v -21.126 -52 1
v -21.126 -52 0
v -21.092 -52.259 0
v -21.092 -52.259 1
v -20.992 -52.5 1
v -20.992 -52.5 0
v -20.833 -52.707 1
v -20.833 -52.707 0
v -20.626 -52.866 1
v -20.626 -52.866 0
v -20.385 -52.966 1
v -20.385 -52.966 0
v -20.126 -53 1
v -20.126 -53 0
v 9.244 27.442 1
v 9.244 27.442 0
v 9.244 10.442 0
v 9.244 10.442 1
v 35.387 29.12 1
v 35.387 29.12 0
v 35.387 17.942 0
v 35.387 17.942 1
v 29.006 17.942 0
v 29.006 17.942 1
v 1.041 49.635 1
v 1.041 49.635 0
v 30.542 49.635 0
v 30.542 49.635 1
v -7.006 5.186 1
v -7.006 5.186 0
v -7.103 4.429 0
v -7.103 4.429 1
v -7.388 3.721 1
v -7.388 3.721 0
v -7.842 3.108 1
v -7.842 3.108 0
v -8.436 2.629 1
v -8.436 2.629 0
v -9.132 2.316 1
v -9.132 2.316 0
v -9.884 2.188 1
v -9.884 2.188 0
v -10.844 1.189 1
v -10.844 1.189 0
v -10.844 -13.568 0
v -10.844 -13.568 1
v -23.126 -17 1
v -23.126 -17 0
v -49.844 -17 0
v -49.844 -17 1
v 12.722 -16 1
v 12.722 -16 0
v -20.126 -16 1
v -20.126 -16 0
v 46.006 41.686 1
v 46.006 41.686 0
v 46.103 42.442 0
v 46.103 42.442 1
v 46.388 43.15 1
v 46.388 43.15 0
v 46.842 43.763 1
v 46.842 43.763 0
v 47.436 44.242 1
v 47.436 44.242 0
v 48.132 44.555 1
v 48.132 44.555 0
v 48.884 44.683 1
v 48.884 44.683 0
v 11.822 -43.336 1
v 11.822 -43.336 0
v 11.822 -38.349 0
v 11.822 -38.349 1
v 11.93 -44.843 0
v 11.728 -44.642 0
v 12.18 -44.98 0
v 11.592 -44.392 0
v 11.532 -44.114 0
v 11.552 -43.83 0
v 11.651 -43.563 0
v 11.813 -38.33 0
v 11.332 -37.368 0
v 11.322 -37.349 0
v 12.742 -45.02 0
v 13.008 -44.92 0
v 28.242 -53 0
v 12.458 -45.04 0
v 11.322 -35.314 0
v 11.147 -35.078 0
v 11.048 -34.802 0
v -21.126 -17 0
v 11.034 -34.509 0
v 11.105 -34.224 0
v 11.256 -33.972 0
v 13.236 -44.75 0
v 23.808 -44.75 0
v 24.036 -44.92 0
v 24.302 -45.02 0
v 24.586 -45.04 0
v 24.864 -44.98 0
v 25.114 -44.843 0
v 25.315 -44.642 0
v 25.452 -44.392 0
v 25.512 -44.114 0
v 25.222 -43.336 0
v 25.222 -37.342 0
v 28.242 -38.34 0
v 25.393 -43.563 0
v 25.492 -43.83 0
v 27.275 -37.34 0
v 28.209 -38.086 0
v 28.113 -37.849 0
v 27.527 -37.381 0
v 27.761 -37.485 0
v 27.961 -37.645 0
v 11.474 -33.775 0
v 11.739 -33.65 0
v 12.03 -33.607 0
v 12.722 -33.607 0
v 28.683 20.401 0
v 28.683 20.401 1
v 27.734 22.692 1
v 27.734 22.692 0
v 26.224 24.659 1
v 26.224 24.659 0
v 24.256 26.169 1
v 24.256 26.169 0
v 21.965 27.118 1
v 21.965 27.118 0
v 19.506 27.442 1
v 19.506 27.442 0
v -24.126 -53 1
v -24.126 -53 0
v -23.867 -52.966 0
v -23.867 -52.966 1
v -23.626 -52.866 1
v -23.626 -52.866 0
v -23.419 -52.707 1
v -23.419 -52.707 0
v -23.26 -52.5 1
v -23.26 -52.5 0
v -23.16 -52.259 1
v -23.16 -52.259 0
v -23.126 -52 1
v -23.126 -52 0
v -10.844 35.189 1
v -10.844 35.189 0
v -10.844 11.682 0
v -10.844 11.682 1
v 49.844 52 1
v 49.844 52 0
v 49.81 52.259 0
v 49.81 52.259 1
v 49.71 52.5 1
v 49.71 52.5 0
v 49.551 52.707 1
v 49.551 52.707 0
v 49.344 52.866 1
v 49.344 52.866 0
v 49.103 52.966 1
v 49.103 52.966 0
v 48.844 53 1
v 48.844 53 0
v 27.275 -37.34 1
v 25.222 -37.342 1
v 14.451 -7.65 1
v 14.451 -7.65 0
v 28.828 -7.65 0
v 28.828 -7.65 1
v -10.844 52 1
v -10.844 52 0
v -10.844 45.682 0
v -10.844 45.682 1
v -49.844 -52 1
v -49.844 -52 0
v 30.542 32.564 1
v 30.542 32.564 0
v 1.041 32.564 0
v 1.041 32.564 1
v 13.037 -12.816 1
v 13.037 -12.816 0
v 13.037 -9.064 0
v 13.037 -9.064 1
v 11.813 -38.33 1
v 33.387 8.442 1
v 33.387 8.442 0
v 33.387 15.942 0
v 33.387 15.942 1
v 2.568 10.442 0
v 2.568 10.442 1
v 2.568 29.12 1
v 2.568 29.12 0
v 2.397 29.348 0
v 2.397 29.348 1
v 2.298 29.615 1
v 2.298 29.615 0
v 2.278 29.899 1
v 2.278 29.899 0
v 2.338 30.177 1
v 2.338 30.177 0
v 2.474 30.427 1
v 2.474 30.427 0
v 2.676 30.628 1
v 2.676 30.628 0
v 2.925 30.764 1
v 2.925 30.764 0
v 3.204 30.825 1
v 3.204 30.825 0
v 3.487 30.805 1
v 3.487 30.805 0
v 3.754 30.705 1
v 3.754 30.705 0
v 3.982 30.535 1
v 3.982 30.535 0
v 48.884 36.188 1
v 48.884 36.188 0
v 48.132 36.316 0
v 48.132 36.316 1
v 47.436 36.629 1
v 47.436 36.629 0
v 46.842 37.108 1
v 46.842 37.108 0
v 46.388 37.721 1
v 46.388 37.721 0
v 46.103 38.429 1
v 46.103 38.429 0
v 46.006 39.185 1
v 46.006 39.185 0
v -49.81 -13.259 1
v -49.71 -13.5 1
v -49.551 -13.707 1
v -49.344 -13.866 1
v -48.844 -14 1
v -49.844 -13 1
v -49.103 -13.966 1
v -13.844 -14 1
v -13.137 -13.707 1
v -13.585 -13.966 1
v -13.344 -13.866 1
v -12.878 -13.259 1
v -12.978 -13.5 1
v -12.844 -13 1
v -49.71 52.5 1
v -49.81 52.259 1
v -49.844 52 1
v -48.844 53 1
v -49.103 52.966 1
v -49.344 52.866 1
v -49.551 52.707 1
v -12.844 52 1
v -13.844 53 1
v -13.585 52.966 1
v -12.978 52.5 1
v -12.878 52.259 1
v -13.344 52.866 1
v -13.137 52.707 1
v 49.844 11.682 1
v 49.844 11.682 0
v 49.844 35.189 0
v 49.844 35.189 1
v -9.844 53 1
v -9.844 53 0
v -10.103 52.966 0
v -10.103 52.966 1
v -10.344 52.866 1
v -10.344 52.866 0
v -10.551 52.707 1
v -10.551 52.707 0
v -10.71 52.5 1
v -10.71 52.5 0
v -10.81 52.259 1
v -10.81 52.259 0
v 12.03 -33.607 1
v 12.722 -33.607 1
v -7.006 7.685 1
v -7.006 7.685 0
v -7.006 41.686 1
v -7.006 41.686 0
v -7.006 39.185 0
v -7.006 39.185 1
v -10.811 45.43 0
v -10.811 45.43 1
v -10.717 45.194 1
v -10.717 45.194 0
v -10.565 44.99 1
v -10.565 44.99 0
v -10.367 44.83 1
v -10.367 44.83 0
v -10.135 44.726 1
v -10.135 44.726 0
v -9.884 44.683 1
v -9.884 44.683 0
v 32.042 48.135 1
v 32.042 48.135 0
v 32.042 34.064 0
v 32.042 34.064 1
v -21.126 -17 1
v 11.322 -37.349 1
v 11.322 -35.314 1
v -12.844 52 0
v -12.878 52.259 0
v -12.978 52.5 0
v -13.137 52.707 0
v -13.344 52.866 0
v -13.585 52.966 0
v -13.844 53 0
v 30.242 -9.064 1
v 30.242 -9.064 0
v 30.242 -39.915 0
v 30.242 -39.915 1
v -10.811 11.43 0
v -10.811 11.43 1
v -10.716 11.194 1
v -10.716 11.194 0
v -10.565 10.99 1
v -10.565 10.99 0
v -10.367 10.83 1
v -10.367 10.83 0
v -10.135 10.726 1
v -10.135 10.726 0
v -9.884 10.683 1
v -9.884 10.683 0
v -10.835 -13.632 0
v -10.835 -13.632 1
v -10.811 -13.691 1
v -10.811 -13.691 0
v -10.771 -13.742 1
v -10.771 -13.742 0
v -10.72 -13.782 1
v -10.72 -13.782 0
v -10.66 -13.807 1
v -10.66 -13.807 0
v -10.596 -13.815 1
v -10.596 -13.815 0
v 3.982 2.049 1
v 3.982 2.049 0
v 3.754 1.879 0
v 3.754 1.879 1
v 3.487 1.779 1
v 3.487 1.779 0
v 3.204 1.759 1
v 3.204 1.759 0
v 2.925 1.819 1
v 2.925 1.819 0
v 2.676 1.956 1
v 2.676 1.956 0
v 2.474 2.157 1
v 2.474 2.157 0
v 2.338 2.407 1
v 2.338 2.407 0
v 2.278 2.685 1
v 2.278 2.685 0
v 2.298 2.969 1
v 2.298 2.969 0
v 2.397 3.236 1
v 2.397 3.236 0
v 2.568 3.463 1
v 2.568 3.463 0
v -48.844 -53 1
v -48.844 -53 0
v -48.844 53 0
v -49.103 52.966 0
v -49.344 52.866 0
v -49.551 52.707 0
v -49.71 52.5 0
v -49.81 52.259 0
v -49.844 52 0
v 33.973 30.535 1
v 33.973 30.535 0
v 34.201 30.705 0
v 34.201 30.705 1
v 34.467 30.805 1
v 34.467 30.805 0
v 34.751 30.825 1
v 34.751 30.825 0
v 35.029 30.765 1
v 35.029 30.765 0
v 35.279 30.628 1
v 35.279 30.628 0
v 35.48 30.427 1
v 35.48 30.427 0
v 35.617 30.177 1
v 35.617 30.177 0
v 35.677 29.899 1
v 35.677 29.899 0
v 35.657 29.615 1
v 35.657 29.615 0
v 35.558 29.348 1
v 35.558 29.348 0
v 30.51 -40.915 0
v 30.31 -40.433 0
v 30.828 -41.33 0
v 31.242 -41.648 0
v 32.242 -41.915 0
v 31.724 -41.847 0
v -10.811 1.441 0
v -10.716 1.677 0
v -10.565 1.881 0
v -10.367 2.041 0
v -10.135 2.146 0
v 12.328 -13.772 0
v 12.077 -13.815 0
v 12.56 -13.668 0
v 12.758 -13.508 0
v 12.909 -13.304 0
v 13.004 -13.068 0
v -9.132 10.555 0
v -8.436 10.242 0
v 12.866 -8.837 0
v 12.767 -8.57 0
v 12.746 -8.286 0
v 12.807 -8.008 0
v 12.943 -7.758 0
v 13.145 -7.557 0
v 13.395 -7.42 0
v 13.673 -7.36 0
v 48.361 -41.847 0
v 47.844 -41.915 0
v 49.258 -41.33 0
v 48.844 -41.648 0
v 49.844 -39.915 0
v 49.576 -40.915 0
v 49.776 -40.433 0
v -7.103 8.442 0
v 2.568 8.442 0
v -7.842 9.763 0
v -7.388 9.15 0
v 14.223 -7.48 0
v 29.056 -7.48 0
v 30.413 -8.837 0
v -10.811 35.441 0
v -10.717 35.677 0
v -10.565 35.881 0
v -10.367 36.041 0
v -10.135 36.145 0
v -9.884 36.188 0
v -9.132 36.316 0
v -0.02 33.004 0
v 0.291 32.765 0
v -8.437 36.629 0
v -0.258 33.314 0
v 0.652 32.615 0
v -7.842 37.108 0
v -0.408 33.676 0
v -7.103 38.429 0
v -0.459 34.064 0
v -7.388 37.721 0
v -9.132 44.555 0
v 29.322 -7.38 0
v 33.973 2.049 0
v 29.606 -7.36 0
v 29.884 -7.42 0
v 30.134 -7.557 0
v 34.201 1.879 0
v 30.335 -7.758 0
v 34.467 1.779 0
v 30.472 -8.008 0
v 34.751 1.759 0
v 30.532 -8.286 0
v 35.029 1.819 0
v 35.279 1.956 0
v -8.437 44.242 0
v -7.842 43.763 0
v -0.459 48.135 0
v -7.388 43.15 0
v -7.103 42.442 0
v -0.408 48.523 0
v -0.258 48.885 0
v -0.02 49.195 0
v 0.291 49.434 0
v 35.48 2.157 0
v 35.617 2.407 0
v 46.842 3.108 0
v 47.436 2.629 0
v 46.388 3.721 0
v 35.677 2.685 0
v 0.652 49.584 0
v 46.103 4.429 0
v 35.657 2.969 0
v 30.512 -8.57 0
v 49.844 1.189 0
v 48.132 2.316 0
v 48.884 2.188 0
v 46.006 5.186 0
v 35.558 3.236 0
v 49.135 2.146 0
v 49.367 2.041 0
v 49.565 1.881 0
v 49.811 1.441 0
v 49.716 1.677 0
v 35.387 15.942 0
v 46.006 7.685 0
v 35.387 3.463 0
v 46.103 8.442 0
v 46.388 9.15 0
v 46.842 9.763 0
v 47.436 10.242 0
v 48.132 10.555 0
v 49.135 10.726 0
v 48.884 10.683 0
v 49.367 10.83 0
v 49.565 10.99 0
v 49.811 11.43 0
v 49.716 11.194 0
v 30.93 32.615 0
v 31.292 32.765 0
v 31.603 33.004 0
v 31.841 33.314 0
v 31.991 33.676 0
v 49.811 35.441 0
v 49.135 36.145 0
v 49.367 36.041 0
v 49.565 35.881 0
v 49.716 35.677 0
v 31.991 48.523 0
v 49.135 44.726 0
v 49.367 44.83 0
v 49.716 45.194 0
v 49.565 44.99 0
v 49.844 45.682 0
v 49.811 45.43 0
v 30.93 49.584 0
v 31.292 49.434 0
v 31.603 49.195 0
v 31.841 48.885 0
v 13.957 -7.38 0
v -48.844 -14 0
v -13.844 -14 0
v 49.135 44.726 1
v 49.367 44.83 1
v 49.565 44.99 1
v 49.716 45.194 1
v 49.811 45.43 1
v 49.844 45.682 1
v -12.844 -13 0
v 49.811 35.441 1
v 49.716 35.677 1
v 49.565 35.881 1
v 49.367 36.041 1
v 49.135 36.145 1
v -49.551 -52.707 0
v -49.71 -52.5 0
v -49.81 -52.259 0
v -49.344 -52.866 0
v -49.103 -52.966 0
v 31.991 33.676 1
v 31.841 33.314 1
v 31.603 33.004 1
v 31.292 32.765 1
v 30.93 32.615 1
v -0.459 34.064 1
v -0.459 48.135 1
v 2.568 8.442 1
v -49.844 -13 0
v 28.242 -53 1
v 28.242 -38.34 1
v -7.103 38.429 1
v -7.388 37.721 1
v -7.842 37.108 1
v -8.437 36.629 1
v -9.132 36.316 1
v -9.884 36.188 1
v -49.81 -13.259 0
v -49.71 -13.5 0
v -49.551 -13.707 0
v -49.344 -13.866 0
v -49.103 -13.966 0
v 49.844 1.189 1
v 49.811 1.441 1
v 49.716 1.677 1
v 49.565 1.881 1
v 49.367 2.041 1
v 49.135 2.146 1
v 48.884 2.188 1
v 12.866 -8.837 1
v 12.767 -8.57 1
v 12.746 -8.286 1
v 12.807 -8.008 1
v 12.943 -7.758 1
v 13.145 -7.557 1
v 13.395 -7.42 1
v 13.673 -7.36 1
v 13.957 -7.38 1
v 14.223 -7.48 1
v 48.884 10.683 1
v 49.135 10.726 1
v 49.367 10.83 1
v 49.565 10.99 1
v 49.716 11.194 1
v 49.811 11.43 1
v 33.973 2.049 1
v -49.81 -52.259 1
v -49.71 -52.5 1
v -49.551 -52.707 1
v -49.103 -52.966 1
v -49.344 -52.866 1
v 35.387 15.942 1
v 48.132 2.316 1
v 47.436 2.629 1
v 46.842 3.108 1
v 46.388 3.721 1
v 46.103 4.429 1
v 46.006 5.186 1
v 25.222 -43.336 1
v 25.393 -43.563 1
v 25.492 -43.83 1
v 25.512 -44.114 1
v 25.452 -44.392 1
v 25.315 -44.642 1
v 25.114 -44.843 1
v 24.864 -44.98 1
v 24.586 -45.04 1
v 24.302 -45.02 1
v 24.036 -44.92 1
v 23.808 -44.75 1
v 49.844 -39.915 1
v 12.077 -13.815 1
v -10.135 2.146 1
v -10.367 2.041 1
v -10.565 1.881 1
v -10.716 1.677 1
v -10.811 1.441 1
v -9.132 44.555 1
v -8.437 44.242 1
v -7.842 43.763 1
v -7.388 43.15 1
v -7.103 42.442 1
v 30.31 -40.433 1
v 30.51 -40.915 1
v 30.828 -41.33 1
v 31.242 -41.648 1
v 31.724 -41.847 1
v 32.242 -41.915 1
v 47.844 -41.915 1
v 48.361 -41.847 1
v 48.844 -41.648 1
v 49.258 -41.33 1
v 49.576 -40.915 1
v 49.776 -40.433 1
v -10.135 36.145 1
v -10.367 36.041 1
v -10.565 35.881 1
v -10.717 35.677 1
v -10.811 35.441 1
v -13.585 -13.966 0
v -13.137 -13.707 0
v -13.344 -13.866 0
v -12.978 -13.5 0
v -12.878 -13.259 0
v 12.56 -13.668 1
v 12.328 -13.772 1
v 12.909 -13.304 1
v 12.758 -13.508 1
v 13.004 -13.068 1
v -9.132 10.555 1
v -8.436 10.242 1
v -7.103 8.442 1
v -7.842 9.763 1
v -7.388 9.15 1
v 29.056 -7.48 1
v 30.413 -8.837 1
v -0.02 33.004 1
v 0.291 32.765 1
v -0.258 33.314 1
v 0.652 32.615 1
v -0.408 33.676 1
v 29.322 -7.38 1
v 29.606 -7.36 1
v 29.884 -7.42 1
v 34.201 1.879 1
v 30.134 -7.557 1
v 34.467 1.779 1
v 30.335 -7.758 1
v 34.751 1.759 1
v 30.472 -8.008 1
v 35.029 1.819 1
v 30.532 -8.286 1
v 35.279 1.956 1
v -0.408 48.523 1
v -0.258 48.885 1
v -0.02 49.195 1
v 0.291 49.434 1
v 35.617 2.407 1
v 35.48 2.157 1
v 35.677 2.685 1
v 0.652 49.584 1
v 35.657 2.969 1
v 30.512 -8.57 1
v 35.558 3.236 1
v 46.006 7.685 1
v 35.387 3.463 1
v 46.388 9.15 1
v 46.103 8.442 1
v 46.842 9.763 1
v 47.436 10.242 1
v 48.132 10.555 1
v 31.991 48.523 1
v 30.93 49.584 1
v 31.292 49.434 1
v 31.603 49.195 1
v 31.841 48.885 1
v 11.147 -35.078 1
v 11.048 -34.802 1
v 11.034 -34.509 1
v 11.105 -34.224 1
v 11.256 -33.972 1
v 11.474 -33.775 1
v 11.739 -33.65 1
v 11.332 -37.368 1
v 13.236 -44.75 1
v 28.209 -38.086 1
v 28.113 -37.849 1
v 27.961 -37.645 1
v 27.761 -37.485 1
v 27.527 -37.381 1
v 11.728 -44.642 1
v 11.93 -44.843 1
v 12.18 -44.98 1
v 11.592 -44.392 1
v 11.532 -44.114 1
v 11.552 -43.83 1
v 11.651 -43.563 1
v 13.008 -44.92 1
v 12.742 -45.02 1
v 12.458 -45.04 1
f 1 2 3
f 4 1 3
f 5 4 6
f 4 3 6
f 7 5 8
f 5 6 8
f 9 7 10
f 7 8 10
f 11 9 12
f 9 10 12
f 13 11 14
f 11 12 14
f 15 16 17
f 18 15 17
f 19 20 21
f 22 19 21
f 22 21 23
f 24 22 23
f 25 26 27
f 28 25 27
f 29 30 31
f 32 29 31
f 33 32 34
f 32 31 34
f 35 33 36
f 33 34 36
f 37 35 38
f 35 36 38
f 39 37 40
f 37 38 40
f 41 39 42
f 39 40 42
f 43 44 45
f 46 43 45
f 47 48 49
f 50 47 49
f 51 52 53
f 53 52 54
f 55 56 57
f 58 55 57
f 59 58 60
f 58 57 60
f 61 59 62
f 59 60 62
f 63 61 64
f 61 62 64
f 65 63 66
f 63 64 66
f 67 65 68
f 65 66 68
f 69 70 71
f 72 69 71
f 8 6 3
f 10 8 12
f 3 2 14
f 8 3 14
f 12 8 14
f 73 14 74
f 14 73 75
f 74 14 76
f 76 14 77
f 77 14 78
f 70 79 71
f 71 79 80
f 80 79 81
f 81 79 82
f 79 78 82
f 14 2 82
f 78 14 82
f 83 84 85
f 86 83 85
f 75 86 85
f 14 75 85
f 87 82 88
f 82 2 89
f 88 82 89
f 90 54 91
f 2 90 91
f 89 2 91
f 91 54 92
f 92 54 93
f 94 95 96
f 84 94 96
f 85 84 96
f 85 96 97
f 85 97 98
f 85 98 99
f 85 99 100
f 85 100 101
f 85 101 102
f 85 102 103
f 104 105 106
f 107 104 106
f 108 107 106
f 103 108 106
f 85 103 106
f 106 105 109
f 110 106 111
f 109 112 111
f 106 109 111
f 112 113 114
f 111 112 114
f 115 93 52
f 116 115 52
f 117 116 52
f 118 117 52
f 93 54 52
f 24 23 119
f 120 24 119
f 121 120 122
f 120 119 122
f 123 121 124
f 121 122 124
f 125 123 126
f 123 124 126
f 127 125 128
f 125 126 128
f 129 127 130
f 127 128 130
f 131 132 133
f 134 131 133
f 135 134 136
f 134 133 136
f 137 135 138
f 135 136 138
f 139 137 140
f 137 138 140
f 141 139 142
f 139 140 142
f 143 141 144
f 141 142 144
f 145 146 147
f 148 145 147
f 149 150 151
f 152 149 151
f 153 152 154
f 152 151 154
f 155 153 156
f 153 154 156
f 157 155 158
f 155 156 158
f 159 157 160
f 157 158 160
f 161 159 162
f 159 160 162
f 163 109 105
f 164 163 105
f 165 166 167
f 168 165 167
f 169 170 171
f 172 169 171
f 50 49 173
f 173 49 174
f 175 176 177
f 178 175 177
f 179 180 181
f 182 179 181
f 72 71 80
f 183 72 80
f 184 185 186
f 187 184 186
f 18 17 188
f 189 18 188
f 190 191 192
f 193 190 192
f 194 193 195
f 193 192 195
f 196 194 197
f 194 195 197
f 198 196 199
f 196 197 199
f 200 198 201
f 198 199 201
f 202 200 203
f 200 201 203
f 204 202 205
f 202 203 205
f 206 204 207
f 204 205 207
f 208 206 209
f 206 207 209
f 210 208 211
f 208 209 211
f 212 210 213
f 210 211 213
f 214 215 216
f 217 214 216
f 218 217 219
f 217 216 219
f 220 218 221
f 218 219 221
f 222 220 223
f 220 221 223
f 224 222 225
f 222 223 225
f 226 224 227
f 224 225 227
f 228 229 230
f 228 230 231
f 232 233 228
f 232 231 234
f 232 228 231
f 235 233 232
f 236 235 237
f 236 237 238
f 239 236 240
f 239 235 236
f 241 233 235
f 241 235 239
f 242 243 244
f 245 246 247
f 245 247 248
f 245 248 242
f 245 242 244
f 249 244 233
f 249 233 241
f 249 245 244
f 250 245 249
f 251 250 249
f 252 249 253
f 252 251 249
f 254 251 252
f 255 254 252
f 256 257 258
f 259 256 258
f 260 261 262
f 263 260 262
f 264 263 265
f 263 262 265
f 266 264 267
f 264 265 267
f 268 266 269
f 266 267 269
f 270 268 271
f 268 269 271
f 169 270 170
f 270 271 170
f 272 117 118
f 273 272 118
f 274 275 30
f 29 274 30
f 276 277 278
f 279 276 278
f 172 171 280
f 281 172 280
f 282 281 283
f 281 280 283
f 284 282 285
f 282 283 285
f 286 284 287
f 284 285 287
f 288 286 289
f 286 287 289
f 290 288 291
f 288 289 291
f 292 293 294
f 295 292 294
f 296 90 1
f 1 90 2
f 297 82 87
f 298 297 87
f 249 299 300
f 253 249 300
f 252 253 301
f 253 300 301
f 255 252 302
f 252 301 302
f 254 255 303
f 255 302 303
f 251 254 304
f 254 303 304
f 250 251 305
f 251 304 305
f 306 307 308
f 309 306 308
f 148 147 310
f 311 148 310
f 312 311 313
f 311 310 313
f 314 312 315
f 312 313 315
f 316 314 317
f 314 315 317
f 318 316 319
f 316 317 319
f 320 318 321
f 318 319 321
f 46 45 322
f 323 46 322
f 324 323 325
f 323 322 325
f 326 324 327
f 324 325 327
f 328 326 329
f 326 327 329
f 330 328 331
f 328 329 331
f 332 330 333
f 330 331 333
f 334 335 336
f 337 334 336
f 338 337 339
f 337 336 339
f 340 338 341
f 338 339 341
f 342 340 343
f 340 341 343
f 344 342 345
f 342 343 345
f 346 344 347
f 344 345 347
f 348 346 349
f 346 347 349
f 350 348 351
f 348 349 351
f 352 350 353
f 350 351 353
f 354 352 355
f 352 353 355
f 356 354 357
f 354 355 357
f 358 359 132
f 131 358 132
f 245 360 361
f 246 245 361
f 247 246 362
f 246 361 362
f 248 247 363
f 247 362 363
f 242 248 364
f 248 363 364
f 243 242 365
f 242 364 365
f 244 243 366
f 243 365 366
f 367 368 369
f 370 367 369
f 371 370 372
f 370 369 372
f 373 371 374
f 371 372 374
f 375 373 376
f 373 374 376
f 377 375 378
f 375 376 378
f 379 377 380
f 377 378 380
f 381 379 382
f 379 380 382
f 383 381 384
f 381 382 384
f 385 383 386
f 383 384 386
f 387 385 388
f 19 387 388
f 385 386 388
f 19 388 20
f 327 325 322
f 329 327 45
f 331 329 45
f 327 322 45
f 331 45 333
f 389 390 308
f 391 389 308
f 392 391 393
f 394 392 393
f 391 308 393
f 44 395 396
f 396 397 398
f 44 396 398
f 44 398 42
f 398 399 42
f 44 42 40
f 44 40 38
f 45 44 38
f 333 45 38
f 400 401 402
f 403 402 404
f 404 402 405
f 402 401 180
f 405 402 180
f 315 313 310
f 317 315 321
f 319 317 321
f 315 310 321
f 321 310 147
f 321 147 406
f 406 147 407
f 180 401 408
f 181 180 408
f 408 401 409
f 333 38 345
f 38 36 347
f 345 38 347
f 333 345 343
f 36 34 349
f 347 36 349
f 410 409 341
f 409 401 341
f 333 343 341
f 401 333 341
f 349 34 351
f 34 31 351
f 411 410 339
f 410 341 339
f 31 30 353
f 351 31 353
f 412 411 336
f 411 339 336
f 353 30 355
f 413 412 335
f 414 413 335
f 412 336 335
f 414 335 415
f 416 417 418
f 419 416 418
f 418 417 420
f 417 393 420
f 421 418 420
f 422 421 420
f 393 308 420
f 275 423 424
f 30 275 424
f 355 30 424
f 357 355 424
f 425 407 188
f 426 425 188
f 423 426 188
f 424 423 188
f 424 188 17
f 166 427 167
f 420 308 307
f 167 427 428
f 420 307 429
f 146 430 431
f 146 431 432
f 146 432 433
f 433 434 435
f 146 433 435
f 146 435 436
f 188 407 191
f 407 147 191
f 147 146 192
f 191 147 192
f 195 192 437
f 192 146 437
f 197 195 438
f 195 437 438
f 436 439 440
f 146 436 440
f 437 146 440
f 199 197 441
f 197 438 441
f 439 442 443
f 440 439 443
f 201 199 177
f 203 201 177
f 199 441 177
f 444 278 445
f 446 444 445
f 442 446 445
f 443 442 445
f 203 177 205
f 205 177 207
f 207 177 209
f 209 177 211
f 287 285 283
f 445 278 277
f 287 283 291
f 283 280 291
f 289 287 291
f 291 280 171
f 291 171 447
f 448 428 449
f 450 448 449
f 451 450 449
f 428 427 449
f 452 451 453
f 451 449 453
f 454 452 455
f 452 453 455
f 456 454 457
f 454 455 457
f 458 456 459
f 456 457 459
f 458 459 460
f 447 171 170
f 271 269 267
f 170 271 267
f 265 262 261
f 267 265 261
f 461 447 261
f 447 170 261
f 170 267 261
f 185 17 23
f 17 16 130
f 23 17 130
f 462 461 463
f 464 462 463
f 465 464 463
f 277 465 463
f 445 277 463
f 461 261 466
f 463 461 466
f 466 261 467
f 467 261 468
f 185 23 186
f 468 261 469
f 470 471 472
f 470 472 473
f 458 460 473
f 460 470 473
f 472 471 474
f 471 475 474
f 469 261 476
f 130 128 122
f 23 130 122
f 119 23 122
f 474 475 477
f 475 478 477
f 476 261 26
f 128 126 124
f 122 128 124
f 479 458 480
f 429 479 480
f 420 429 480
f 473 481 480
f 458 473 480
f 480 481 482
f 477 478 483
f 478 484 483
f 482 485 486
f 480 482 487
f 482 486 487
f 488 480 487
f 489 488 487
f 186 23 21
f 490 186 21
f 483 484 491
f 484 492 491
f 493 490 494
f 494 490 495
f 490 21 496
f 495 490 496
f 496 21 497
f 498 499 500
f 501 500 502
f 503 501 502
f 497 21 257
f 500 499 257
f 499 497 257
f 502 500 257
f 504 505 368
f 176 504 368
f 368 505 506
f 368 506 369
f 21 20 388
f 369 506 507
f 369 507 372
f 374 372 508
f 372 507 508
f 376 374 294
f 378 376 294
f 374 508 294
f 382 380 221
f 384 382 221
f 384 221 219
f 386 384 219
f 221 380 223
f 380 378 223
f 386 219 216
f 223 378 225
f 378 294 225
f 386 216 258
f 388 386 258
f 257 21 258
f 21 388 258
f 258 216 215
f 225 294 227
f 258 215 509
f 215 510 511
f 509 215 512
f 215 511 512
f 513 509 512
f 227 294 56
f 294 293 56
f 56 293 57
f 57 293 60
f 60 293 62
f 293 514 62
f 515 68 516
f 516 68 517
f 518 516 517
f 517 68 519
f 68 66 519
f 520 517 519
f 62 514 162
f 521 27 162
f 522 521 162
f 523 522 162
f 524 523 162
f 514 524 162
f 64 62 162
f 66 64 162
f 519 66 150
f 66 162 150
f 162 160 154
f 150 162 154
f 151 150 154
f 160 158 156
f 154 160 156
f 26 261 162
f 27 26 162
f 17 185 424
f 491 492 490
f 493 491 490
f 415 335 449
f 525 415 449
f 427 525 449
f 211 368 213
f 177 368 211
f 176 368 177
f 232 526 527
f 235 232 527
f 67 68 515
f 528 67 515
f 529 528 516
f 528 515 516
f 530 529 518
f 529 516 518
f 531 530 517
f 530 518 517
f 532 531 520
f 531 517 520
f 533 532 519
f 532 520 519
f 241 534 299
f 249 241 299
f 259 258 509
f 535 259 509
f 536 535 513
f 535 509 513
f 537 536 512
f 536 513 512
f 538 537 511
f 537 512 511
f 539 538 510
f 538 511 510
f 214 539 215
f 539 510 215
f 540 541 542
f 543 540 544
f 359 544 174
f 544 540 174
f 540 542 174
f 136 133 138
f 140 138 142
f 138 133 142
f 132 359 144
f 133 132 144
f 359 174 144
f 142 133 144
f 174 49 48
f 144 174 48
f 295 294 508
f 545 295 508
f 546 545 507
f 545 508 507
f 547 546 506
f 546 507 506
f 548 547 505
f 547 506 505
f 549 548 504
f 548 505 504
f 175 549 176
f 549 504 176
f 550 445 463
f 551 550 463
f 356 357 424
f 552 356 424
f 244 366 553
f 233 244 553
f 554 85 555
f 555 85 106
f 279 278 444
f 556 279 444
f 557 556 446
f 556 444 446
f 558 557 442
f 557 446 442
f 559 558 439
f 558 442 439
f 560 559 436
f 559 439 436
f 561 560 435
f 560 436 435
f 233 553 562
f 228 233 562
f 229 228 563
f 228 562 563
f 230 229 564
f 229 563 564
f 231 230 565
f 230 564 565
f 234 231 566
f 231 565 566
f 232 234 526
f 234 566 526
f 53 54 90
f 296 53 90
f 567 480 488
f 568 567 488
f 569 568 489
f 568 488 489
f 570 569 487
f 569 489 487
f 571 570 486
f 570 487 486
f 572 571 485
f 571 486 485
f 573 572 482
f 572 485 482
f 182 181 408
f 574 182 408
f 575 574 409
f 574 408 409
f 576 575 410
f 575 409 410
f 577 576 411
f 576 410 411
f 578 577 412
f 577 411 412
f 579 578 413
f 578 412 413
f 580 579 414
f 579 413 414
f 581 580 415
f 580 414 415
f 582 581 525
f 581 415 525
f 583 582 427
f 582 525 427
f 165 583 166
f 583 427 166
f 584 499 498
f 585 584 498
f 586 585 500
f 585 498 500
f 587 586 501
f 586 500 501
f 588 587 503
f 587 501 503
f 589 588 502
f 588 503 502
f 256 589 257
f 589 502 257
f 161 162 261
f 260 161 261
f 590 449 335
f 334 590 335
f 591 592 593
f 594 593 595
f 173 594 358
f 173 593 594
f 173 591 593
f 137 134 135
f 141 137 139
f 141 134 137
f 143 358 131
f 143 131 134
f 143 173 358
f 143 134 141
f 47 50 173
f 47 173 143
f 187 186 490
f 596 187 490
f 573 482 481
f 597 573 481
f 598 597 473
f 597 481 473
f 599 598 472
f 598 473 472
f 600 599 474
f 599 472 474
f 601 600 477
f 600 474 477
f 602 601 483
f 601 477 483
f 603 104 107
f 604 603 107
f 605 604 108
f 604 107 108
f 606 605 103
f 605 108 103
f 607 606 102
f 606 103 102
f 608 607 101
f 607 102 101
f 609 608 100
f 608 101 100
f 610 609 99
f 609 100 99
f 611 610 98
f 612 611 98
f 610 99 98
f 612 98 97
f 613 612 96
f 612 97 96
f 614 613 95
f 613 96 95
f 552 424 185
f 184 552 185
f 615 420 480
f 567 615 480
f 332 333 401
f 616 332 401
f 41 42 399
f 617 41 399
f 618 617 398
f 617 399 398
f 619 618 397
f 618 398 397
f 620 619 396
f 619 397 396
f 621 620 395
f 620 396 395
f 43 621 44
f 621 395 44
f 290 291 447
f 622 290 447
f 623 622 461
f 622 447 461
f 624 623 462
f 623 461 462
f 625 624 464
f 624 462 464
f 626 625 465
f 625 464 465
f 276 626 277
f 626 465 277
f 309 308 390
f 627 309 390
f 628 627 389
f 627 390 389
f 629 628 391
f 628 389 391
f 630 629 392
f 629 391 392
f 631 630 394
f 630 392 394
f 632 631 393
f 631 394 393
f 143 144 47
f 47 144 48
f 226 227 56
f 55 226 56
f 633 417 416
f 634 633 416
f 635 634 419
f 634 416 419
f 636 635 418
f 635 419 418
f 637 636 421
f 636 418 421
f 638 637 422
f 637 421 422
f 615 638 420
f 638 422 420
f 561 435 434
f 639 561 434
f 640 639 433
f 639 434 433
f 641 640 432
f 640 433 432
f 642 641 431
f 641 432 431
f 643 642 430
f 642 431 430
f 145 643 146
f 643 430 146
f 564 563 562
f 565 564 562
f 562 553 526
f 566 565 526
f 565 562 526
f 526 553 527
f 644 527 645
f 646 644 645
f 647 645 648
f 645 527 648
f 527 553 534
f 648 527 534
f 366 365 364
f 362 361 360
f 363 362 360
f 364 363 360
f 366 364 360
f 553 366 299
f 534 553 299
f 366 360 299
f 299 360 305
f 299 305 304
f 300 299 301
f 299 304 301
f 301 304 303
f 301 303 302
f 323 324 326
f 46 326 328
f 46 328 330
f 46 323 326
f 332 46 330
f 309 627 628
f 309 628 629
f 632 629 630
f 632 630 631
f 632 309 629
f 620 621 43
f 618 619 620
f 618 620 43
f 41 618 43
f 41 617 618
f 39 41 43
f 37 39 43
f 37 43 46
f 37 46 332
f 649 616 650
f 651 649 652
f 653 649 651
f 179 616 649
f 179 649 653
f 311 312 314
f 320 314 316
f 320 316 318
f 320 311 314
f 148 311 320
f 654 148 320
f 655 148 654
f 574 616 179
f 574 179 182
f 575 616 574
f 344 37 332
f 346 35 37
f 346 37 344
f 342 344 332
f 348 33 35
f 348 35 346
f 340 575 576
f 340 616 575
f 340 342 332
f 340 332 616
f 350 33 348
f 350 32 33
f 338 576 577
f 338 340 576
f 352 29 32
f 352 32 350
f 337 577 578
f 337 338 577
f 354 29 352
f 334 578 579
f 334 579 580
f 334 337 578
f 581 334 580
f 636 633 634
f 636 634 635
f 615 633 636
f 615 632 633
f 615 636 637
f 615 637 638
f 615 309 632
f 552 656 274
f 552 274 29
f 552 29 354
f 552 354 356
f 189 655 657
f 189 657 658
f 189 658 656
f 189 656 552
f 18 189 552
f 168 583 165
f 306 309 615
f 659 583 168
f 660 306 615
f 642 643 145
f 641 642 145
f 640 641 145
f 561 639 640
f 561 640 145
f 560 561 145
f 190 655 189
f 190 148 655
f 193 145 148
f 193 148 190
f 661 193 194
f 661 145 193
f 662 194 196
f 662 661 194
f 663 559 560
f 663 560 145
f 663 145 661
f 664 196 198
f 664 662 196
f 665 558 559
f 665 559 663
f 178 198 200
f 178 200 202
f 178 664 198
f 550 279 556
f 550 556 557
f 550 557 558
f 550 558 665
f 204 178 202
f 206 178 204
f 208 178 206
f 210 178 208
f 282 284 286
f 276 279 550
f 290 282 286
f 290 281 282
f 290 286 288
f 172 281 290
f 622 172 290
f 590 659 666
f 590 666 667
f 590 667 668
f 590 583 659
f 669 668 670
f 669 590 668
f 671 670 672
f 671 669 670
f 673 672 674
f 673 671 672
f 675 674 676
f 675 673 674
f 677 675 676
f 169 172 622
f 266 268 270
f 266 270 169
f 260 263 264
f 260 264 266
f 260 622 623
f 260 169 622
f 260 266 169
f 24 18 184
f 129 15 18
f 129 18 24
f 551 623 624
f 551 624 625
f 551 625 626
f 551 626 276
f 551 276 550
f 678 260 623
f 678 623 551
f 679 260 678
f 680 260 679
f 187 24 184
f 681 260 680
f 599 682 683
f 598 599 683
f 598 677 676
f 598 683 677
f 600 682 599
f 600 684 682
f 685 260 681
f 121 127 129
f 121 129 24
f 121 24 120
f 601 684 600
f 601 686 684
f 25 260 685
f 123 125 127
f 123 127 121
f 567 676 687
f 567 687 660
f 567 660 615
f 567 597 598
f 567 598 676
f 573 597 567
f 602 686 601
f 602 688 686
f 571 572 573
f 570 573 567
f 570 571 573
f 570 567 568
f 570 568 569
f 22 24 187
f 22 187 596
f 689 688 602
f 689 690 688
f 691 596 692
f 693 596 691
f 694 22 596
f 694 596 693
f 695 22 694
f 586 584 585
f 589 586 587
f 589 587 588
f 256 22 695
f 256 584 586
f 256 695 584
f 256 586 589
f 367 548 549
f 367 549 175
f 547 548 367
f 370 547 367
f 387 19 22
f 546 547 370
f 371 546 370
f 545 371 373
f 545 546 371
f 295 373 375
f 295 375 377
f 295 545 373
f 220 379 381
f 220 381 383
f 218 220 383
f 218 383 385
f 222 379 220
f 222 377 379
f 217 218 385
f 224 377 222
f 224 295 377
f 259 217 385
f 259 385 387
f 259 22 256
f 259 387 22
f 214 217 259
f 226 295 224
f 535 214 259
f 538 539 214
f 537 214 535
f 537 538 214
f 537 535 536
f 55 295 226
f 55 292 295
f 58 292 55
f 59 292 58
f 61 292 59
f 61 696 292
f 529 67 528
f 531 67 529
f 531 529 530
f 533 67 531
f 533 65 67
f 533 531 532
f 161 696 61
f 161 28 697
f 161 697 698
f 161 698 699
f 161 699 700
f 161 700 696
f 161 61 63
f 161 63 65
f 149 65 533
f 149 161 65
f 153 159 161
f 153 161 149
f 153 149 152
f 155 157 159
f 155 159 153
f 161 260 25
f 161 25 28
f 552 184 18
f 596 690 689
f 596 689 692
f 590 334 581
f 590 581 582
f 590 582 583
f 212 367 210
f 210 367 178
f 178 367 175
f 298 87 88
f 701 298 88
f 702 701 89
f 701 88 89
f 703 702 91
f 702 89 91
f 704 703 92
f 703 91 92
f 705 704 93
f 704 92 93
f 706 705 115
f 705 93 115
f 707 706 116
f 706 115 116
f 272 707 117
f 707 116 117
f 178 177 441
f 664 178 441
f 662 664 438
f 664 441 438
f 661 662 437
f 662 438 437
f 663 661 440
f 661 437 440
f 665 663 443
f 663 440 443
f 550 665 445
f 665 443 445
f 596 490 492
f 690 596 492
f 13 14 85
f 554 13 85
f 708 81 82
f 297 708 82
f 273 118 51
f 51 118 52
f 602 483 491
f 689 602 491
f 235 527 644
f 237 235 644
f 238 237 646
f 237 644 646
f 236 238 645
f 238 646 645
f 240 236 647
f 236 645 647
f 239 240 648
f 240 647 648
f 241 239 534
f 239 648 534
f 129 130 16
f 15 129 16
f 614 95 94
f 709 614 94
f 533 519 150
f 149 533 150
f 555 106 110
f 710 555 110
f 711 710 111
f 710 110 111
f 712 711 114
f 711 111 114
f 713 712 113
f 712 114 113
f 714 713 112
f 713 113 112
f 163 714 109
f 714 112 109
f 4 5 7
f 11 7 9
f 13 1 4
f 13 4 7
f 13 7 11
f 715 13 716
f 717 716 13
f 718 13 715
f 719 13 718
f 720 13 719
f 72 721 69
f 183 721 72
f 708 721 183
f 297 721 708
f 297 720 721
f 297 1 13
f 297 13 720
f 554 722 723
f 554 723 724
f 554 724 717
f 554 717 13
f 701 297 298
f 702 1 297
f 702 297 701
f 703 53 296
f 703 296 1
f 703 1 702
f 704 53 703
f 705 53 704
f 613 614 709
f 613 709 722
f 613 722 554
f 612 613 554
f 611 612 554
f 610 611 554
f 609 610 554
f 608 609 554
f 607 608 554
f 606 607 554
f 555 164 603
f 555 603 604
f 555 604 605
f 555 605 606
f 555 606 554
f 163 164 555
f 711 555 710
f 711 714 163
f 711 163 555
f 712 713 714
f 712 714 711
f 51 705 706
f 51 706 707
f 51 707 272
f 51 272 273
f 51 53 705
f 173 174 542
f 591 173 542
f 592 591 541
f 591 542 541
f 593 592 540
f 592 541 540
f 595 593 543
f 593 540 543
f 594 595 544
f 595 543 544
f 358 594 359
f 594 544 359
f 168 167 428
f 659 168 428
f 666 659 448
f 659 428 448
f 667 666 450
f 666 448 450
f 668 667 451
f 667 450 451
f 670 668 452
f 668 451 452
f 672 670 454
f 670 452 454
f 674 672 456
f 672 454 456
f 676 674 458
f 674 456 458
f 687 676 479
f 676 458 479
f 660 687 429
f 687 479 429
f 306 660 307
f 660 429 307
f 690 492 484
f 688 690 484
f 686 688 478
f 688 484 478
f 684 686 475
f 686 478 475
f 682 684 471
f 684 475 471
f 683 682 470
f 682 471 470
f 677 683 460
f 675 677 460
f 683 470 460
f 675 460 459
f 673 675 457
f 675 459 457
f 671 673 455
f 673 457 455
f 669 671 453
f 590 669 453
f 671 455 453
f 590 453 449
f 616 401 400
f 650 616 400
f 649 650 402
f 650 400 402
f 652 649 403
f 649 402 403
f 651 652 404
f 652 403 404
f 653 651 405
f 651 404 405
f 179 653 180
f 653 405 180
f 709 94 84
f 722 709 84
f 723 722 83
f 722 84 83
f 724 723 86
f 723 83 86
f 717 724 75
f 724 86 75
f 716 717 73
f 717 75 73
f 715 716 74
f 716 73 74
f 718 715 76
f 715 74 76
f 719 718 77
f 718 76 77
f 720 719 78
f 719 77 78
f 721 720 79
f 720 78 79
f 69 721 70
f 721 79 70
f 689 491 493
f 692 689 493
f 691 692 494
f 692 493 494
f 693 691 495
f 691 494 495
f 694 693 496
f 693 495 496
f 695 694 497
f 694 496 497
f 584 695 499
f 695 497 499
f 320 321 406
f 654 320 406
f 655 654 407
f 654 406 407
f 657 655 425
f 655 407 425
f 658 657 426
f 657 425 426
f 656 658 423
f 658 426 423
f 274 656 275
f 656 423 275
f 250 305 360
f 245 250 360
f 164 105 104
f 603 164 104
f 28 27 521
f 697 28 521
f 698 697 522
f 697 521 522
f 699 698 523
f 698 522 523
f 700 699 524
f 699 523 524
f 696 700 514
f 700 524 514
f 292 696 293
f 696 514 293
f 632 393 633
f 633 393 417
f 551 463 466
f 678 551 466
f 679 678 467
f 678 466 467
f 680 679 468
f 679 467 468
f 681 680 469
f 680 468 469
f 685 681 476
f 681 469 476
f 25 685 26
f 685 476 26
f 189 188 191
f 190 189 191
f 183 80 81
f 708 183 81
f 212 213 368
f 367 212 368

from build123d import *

# Parameters (mm, degrees)
F1_DEPTH = 1


# Not quite as in the source:
# - ends of sketch curves that miss each other by under 0.0002 mm in the source are joined


with BuildPart() as f1:
    # F0 (on Top) → F1 (new body)
    with BuildSketch(Plane.XY):
        with BuildLine():
            Line((-49.84369, 52.000023), (-49.84369, -4.632071))
            Line((-49.84369, -4.632071), (-49.84369, -12.999847))
            ThreePointArc((-49.84369, -12.999847), (-49.5508014675, -13.7069564675), (-48.843692, -13.999845))
            Line((-48.843692, -13.999845), (-13.843762, -13.999845))
            ThreePointArc((-13.843762, -13.9998449989), (-13.136642867, -13.706966133), (-12.8437640011, -12.999847))
            Line((-12.843764, -12.999847), (-12.843764, -4.632071))
            Line((-12.843764, -4.632071), (-12.843764, 52.000023))
            ThreePointArc((-12.8437640013, 52.000023), (-13.1366419884, 52.7071430116), (-13.843762, 53.0000209987))
            Line((-13.843762, 53.000021), (-48.843692, 53.000021))
            ThreePointArc((-48.843692, 53.0000209998), (-49.5508026391, 52.7071336391), (-49.8436899998, 52.000023))
        make_face()
    extrude(amount=F1_DEPTH)


with BuildPart() as f1b:
    # F0 (on Top) → F1, piece 2 (new body)
    with BuildSketch(Plane.XY):
        with BuildLine():
            Line((-48.843692, -53.000021), (-24.125936, -53.000021))
            ThreePointArc((-24.125936, -53.000021), (-23.4188315117, -52.7071274883), (-23.125938, -52.000023))
            Line((-23.125938, -52.000023), (-23.125938, -16.999839))
            Line((-23.125938, -16.999839), (-49.84369, -16.999839))
            Line((-49.84369, -16.999839), (-49.84369, -52.000023))
            ThreePointArc((-49.843689999, -52.000023), (-49.5507844797, -52.7071154797), (-48.843692, -53.000020999))
        make_face()
    extrude(amount=F1_DEPTH)


with BuildPart() as f1c:
    # F0 (on Top) → F1, piece 3 (new body)
    with BuildSketch(Plane.XY):
        with BuildLine():
            ThreePointArc((11.3220496611, -35.3140013389), (11.1054475003, -34.2240151152), (12.0297310005, -33.6070171613))
            Line((12.0297310005, -33.6070171613), (12.722098, -33.607018))
            Line((12.722098, -33.607018), (12.722098, -15.999841))
            Line((12.722098, -15.999841), (-20.125944, -15.999841))
            Line((-20.125944, -15.999841), (-21.125942, -16.999839))
            Line((-21.125942, -16.999839), (-21.125942, -52.000023))
            ThreePointArc((-21.125942, -52.000023), (-20.8330265213, -52.7071055213), (-20.125944, -53.000020997))
            Line((-20.125944, -53.000020997), (28.242006, -53.000021))
            Line((28.242006, -53.000021), (28.242006, -52.000023))
            Line((28.242006, -52.000023), (28.242006, -38.339903))
            ThreePointArc((28.242006, -38.339903), (27.9606950958, -37.6445668865), (27.2750267787, -37.3404499772))
            Line((27.2750267787, -37.3404499772), (25.221946, -37.341683))
            Line((25.221946, -37.341683), (25.221946, -43.335575))
            ThreePointArc((25.221946, -43.335575), (25.2219457726, -44.7498467726), (23.8076742274, -44.7498467726))
            Line((23.8076742274, -44.7498467726), (13.236194, -44.749847))
            ThreePointArc((13.236194, -44.749847), (11.8219222274, -44.7498467726), (11.8219222274, -43.3355752274))
            Line((11.8219222274, -43.3355752274), (11.821922, -38.348793))
            Line((11.821922, -38.348793), (11.8126693234, -38.3302876467))
            Line((11.8126693234, -38.3302876467), (11.3316786766, -37.3683063533))
            Line((11.3316786766, -37.3683063533), (11.32205, -37.349049))
            Line((11.32205, -37.349049), (11.3220496611, -35.3140013389))
        make_face()
    extrude(amount=F1_DEPTH)


with BuildPart() as f1d:
    # F0 (on Top) → F1, piece 4 (new body)
    with BuildSketch(Plane.XY):
        with BuildLine():
            Line((-9.84377, -13.814933), (12.077446, -13.814933))
            ThreePointArc((12.077446, -13.814933), (12.7580726434, -13.5084192102), (13.0368039831, -12.815951))
            Line((13.0368039831, -12.815951), (13.036804, -9.064371))
            ThreePointArc((13.036804, -9.064371), (13.0368846628, -7.6501796628), (14.4510763316, -7.6503526685))
            Line((14.4510763316, -7.6503526685), (28.82773, -7.650353))
            ThreePointArc((28.82773, -7.650353), (30.2419053372, -7.6501956628), (30.2420023393, -9.0643713393))
            Line((30.2420023393, -9.0643713393), (30.242002, -39.915465))
            ThreePointArc((30.242002, -39.915465), (30.8277878518, -41.3296751482), (32.241998, -41.915461))
            Line((32.241998, -41.915461), (47.843694, -41.915461))
            ThreePointArc((47.843694, -41.915461), (49.2579050268, -41.3296760268), (49.84369, -39.915465))
            Line((49.84369, -39.915465), (49.84369, 1.188847))
            ThreePointArc((49.84369, 1.188847), (49.5650323815, 1.8814639379), (48.8843320024, 2.1880830581))
            ThreePointArc((48.8843320024, 2.1880830581), (46.8422776076, 3.1078090407), (46.0062580004, 5.185537))
            Line((46.0062580004, 5.185537), (46.006258, 7.685405))
            ThreePointArc((46.006258, 7.685405), (46.8422117178, 9.7632741192), (48.884332003, 10.6831129264))
            ThreePointArc((48.884332003, 10.6831129264), (49.5649667808, 10.9896189332), (49.8436899878, 11.682095))
            Line((49.8436899878, 11.682095), (49.84369, 35.188779))
            ThreePointArc((49.84369, 35.188779), (49.5650387607, 35.8814020397), (48.884331999, 36.1880149755))
            ThreePointArc((48.884331999, 36.1880149755), (46.8422836938, 37.10774685), (46.0062580008, 39.185469))
            Line((46.0062580008, 39.185469), (46.006258, 41.685591))
            ThreePointArc((46.006258, 41.685591), (46.8422927104, 43.7633044161), (48.8843320031, 44.683044923))
            ThreePointArc((48.8843320031, 44.683044923), (49.5650483633, 44.9896486415), (49.8436899971, 45.682281))
            Line((49.8436899971, 45.682281), (49.84369, 52.000023))
            ThreePointArc((49.84369, 52.000023), (49.5508032248, 52.7071342248), (48.843692, 53.0000209998))
            Line((48.843692, 53.0000209998), (-9.84377, 53.000021))
            ThreePointArc((-9.84377, 53.000021), (-10.5508812248, 52.7071342248), (-10.8437679998, 52.000023))
            Line((-10.8437679998, 52.000023), (-10.843768, 45.682281))
            ThreePointArc((-10.843768, 45.682281), (-10.5651263633, 44.9896486415), (-9.8844100134, 44.6830446702))
            ThreePointArc((-9.8844100134, 44.6830446702), (-7.8423707104, 43.7633044161), (-7.0063360017, 41.685591))
            Line((-7.0063360017, 41.685591), (-7.006336, 39.185469))
            ThreePointArc((-7.006336, 39.185469), (-7.8423616938, 37.10774685), (-9.884409992, 36.1880148021))
            ThreePointArc((-9.884409992, 36.1880148021), (-10.5651167607, 35.8814020397), (-10.8437679991, 35.188779))
            Line((-10.8437679991, 35.188779), (-10.843768, 11.682095))
            ThreePointArc((-10.843768, 11.682095), (-10.5650447808, 10.9896189332), (-9.88441001, 10.683112754))
            ThreePointArc((-9.88441001, 10.683112754), (-7.8422897178, 9.7632741192), (-7.0063360028, 7.685405))
            Line((-7.0063360028, 7.685405), (-7.006336, 5.185537))
            ThreePointArc((-7.006336, 5.185537), (-7.8423556076, 3.1078090407), (-9.884409997, 2.1880829253))
            ThreePointArc((-9.884409997, 2.1880829253), (-10.5651103815, 1.8814639379), (-10.8437679998, 1.188847))
            Line((-10.8437679998, 1.188847), (-10.8437679998, -13.5675381968))
            ThreePointArc((-10.8437679998, -13.5675381968), (-10.7713077396, -13.7424727398), (-10.5963731966, -13.814933))
            Line((-10.5963731966, -13.814933), (-9.84377, -13.814933))
        make_face()
        with BuildLine():
            Line((33.38703, 8.442071), (33.38703, 15.941929))
            Line((33.38703, 15.941929), (35.387026, 15.941929))
            Line((35.387026, 15.941929), (35.387026, 3.463417))
            ThreePointArc((35.387026, 3.463417), (35.3870257726, 2.0491452274), (33.9727542274, 2.0491452274))
            Line((33.9727542274, 2.0491452274), (3.981958, 2.049145))
            ThreePointArc((3.981958, 2.049145), (2.5677996628, 2.0492586628), (2.5679396641, 3.463417336))
            Line((2.5679396641, 3.463417336), (2.56794, 8.442071))
            Line((2.56794, 8.442071), (33.38703, 8.442071))
        make_face(mode=Mode.SUBTRACT)
        with BuildLine():
            Line((35.387026, 17.941925), (29.006292, 17.941925))
            ThreePointArc((29.006292, 17.941925), (26.2238894867, 24.6594508816), (19.506438, 27.4420329985))
            Line((19.506438, 27.4420329985), (9.243822, 27.442033))
            Line((9.243822, 27.442033), (9.243822, 10.442067))
            Line((9.243822, 10.442067), (2.56794, 10.442067))
            Line((2.56794, 10.442067), (2.56794, 29.120465))
            ThreePointArc((2.56794, 29.120465), (2.5677936628, 30.5346293372), (3.9819583386, 30.5347373387))
            Line((3.9819583386, 30.5347373387), (33.972754, 30.534737))
            ThreePointArc((33.972754, 30.534737), (35.3870257726, 30.5347367726), (35.3870257726, 29.1204652274))
            Line((35.3870257726, 29.1204652274), (35.387026, 17.941925))
        make_face(mode=Mode.SUBTRACT)
        with BuildLine():
            ThreePointArc((32.0420999981, 34.064321), (31.60274582, 33.00355118), (30.541976, 32.5641970019))
            Line((30.541976, 32.564197), (1.040638, 32.564197))
            ThreePointArc((1.040638, 32.5641970082), (-0.0199740624, 33.0036345427), (-0.4592319969, 34.064321))
            Line((-0.459232, 34.064321), (-0.459232, 48.134651))
            ThreePointArc((-0.4592319965, 48.134651), (-0.0199758198, 49.1953392147), (1.040638, 49.6347749924))
            Line((1.040638, 49.634775), (30.541976, 49.634775))
            ThreePointArc((30.541976, 49.6347749978), (31.6027475774, 49.1954225774), (32.0420999978, 48.134651))
            Line((32.0421, 48.134651), (32.0421, 34.064321))
        make_face(mode=Mode.SUBTRACT)
    extrude(amount=F1_DEPTH)


solid = Compound([f1.part, f1b.part, f1c.part, f1d.part])
